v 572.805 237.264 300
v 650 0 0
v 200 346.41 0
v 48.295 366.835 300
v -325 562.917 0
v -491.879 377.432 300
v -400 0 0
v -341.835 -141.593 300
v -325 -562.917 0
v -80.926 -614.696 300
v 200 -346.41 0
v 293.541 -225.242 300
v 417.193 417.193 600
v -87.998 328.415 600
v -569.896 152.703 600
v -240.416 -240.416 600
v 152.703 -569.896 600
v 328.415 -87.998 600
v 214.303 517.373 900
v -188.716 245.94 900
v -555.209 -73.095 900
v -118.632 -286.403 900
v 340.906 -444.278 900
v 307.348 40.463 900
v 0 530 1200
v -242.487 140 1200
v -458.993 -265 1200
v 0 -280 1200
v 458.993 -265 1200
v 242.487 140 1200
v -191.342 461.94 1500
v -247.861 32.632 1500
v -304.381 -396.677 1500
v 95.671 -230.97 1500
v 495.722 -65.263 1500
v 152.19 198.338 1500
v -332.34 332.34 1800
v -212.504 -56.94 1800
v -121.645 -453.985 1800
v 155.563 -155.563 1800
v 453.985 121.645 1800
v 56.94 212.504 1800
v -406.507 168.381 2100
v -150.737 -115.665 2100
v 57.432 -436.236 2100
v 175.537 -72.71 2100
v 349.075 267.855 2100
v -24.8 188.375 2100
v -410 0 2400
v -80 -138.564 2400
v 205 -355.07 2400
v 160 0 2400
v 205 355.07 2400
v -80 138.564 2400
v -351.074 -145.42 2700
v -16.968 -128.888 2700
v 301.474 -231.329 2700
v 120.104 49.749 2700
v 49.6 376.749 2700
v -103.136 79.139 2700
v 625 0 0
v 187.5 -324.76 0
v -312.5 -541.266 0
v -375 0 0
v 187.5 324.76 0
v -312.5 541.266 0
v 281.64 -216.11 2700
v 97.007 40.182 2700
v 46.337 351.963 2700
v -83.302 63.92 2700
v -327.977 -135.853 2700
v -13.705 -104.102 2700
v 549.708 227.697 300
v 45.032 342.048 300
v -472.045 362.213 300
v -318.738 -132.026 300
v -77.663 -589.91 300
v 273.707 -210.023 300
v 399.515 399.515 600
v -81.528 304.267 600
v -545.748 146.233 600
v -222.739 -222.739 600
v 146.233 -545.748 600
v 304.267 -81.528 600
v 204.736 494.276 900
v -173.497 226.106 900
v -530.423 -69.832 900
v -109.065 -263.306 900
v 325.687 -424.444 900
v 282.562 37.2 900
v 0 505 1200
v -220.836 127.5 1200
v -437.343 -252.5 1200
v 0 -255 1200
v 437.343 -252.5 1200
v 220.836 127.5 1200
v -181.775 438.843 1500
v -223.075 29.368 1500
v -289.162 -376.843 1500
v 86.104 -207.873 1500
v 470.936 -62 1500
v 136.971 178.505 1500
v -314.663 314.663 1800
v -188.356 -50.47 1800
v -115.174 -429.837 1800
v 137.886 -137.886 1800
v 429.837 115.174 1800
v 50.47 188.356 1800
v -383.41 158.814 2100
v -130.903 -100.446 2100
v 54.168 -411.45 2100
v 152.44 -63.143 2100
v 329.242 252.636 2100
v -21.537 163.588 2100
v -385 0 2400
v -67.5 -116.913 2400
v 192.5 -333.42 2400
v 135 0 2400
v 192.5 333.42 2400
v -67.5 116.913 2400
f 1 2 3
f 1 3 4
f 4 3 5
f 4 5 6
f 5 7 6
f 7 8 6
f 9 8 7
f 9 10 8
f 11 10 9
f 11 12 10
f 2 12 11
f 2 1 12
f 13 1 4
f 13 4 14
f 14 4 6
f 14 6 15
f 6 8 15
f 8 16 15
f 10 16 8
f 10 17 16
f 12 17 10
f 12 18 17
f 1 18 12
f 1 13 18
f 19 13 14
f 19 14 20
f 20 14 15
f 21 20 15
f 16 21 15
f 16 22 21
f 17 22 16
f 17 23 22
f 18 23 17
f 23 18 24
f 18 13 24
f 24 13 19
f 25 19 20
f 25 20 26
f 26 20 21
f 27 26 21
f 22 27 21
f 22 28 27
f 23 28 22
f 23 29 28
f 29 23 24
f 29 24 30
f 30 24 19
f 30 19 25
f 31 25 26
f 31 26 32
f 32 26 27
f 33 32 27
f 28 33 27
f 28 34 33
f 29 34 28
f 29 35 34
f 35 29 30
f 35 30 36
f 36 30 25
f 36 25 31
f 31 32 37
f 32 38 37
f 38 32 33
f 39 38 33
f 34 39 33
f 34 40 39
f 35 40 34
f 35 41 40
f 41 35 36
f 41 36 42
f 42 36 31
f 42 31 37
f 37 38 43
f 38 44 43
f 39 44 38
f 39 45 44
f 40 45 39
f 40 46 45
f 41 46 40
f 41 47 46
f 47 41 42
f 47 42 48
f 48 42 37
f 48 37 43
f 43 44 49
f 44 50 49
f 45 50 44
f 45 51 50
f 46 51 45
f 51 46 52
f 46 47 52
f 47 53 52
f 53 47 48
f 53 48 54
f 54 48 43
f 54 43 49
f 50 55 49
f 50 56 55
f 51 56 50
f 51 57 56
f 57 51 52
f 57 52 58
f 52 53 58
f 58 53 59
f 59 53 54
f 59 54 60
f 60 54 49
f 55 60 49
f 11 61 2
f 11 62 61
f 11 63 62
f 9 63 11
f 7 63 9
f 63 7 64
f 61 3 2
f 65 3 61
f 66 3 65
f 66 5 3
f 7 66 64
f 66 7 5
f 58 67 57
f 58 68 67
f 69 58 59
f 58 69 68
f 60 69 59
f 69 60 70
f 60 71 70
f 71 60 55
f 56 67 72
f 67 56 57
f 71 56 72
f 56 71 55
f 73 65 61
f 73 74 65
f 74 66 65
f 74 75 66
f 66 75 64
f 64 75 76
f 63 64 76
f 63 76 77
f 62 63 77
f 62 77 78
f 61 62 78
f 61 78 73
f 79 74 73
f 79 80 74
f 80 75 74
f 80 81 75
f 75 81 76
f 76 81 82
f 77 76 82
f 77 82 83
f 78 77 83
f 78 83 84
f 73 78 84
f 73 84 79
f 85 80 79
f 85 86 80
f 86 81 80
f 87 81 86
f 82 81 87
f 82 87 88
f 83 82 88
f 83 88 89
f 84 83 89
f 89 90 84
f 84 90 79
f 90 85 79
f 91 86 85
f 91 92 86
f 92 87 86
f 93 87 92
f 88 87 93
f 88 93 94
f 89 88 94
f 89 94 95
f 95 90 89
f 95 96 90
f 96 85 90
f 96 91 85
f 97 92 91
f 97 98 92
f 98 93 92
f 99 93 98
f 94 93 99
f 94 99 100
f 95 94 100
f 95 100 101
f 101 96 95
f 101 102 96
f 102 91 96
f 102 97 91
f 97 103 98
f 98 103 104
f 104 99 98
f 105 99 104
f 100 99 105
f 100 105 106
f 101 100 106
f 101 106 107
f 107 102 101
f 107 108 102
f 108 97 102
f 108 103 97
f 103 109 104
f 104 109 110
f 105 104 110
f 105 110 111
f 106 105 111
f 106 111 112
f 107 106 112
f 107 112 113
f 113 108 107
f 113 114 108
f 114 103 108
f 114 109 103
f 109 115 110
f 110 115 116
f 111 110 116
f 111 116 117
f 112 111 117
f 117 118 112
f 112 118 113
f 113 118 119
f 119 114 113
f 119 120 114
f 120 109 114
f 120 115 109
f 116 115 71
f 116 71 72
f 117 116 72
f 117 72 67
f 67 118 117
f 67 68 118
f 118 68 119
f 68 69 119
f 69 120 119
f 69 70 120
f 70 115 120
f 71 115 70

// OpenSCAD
difference() {
	polyhedron(faces = [[0, 6, 1], [1, 6, 7], [1, 7, 2], [2, 7, 8], [2, 8, 3], [3, 8, 9], [3, 9, 4], [4, 9, 10], [4, 10, 5], [5, 10, 11], [5, 11, 0], [0, 11, 6], [6, 12, 7], [7, 12, 13], [7, 13, 8], [8, 13, 14], [8, 14, 9], [9, 14, 15], [9, 15, 10], [10, 15, 16], [10, 16, 11], [11, 16, 17], [11, 17, 6], [6, 17, 12], [12, 18, 13], [13, 18, 19], [13, 19, 14], [14, 19, 20], [14, 20, 15], [15, 20, 21], [15, 21, 16], [16, 21, 22], [16, 22, 17], [17, 22, 23], [17, 23, 12], [12, 23, 18], [18, 24, 19], [19, 24, 25], [19, 25, 20], [20, 25, 26], [20, 26, 21], [21, 26, 27], [21, 27, 22], [22, 27, 28], [22, 28, 23], [23, 28, 29], [23, 29, 18], [18, 29, 24], [24, 30, 25], [25, 30, 31], [25, 31, 26], [26, 31, 32], [26, 32, 27], [27, 32, 33], [27, 33, 28], [28, 33, 34], [28, 34, 29], [29, 34, 35], [29, 35, 24], [24, 35, 30], [30, 36, 31], [31, 36, 37], [31, 37, 32], [32, 37, 38], [32, 38, 33], [33, 38, 39], [33, 39, 34], [34, 39, 40], [34, 40, 35], [35, 40, 41], [35, 41, 30], [30, 41, 36], [36, 42, 37], [37, 42, 43], [37, 43, 38], [38, 43, 44], [38, 44, 39], [39, 44, 45], [39, 45, 40], [40, 45, 46], [40, 46, 41], [41, 46, 47], [41, 47, 36], [36, 47, 42], [42, 48, 43], [43, 48, 49], [43, 49, 44], [44, 49, 50], [44, 50, 45], [45, 50, 51], [45, 51, 46], [46, 51, 52], [46, 52, 47], [47, 52, 53], [47, 53, 42], [42, 53, 48], [48, 54, 49], [49, 54, 55], [49, 55, 50], [50, 55, 56], [50, 56, 51], [51, 56, 57], [51, 57, 52], [52, 57, 58], [52, 58, 53], [53, 58, 59], [53, 59, 48], [48, 59, 54], [1, 60, 0], [54, 61, 55], [2, 60, 1], [55, 61, 56], [3, 60, 2], [56, 61, 57], [4, 60, 3], [57, 61, 58], [5, 60, 4], [58, 61, 59], [0, 60, 5], [59, 61, 54]], points = [[650.0000000000, 0.0000000000, 0.0000000000], [200.0000000000, 346.4101615138, 0.0000000000], [-325.0000000000, 562.9165124599, 0.0000000000], [-400.0000000000, 0.0000000000, 0.0000000000], [-325.0000000000, -562.9165124599, 0.0000000000], [200.0000000000, -346.4101615138, 0.0000000000], [572.8053101570, 237.2637280664, 300.0000000000], [48.2946911214, 366.8345987083, 300.0000000000], [-491.8790709806, 377.4320859854, 300.0000000000], [-341.8354270292, -141.5928699751, 300.0000000000], [-80.9262391764, -614.6958140518, 300.0000000000], [293.5407359078, -225.2417287332, 300.0000000000], [417.1930009001, 417.1930009001, 600.0000000000], [-87.9984753349, 328.4147809383, 600.0000000000], [-569.8962375106, 152.7032366105, 600.0000000000], [-240.4163056034, -240.4163056034, 600.0000000000], [152.7032366105, -569.8962375106, 600.0000000000], [328.4147809383, -87.9984753349, 600.0000000000], [214.3027221245, 517.3725382063, 900.0000000000], [-188.7160429927, 245.9395354903, 900.0000000000], [-555.2091223693, -73.0946676432, 900.0000000000], [-118.6318640332, -286.4026550785, 900.0000000000], [340.9064002449, -444.2778705631, 900.0000000000], [307.3479070259, 40.4631195882, 900.0000000000], [0.0000000000, 530.0000000000, 1200.0000000000], [-242.4871130596, 140.0000000000, 1200.0000000000], [-458.9934640058, -265.0000000000, 1200.0000000000], [-0.0000000000, -280.0000000000, 1200.0000000000], [458.9934640058, -265.0000000000, 1200.0000000000], [242.4871130596, 140.0000000000, 1200.0000000000], [-191.3417161825, 461.9397662556, 1500.0000000000], [-247.8612153435, 32.6315480550, 1500.0000000000], [-304.3807145044, -396.6766701456, 1500.0000000000], [95.6708580913, -230.9698831278, 1500.0000000000], [495.7224306869, -65.2630961100, 1500.0000000000], [152.1903572522, 198.3383350728, 1500.0000000000], [-332.3401871577, 332.3401871577, 1800.0000000000], [-212.5036817836, -56.9401899226, 1800.0000000000], [-121.6449511982, -453.9851383559, 1800.0000000000], [155.5634918610, -155.5634918610, 1800.0000000000], [453.9851383559, 121.6449511982, 1800.0000000000], [56.9401899226, 212.5036817836, 1800.0000000000], [-406.5069943050, 168.3807102406, 2100.0000000000], [-150.7371346553, -115.6646715117, 2100.0000000000], [57.4315245768, -436.2357390045, 2100.0000000000], [175.5371111771, -72.7098521494, 2100.0000000000], [349.0754697281, 267.8550287638, 2100.0000000000], [-24.7999765218, 188.3745236610, 2100.0000000000], [-410.0000000000, 0.0000000000, 2400.0000000000], [-80.0000000000, -138.5640646055, 2400.0000000000], [205.0000000000, -355.0704155516, 2400.0000000000], [160.0000000000, -0.0000000000, 2400.0000000000], [205.0000000000, 355.0704155516, 2400.0000000000], [-80.0000000000, 138.5640646055, 2400.0000000000], [-351.0742223543, -145.4197042987, 2700.0000000000], [-16.9684049886, -128.8878319786, 2700.0000000000], [301.4742693107, -231.3293430233, 2700.0000000000], [120.1043392265, 49.7488462075, 2700.0000000000], [49.5999530436, 376.7490473220, 2700.0000000000], [-103.1359342379, 79.1389857711, 2700.0000000000], [-0.0000000000, 0.0000000000, 0.0000000000], [0.0000000000, -0.0000000000, 2700.0000000000]]);
	polyhedron(faces = [[0, 6, 1], [1, 6, 7], [1, 7, 2], [2, 7, 8], [2, 8, 3], [3, 8, 9], [3, 9, 4], [4, 9, 10], [4, 10, 5], [5, 10, 11], [5, 11, 0], [0, 11, 6], [6, 12, 7], [7, 12, 13], [7, 13, 8], [8, 13, 14], [8, 14, 9], [9, 14, 15], [9, 15, 10], [10, 15, 16], [10, 16, 11], [11, 16, 17], [11, 17, 6], [6, 17, 12], [12, 18, 13], [13, 18, 19], [13, 19, 14], [14, 19, 20], [14, 20, 15], [15, 20, 21], [15, 21, 16], [16, 21, 22], [16, 22, 17], [17, 22, 23], [17, 23, 12], [12, 23, 18], [18, 24, 19], [19, 24, 25], [19, 25, 20], [20, 25, 26], [20, 26, 21], [21, 26, 27], [21, 27, 22], [22, 27, 28], [22, 28, 23], [23, 28, 29], [23, 29, 18], [18, 29, 24], [24, 30, 25], [25, 30, 31], [25, 31, 26], [26, 31, 32], [26, 32, 27], [27, 32, 33], [27, 33, 28], [28, 33, 34], [28, 34, 29], [29, 34, 35], [29, 35, 24], [24, 35, 30], [30, 36, 31], [31, 36, 37], [31, 37, 32], [32, 37, 38], [32, 38, 33], [33, 38, 39], [33, 39, 34], [34, 39, 40], [34, 40, 35], [35, 40, 41], [35, 41, 30], [30, 41, 36], [36, 42, 37], [37, 42, 43], [37, 43, 38], [38, 43, 44], [38, 44, 39], [39, 44, 45], [39, 45, 40], [40, 45, 46], [40, 46, 41], [41, 46, 47], [41, 47, 36], [36, 47, 42], [42, 48, 43], [43, 48, 49], [43, 49, 44], [44, 49, 50], [44, 50, 45], [45, 50, 51], [45, 51, 46], [46, 51, 52], [46, 52, 47], [47, 52, 53], [47, 53, 42], [42, 53, 48], [48, 54, 49], [49, 54, 55], [49, 55, 50], [50, 55, 56], [50, 56, 51], [51, 56, 57], [51, 57, 52], [52, 57, 58], [52, 58, 53], [53, 58, 59], [53, 59, 48], [48, 59, 54], [1, 60, 0], [54, 61, 55], [2, 60, 1], [55, 61, 56], [3, 60, 2], [56, 61, 57], [4, 60, 3], [57, 61, 58], [5, 60, 4], [58, 61, 59], [0, 60, 5], [59, 61, 54]], points = [[625.0000000000, 0.0000000000, 0.0000000000], [187.5000000000, 324.7595264192, 0.0000000000], [-312.5000000000, 541.2658773653, 0.0000000000], [-375.0000000000, 0.0000000000, 0.0000000000], [-312.5000000000, -541.2658773653, 0.0000000000], [187.5000000000, -324.7595264192, 0.0000000000], [549.7083218442, 227.6966422572, 300.0000000000], [45.0315363159, 342.0484771740, 300.0000000000], [-472.0452374733, 362.2130502602, 300.0000000000], [-318.7384387164, -132.0257841660, 300.0000000000], [-77.6630843709, -589.9096925174, 300.0000000000], [273.7069024005, -210.0226930080, 300.0000000000], [399.5153313704, 399.5153313704, 600.0000000000], [-81.5279992073, 304.2666352811, 600.0000000000], [-545.7480918533, 146.2327604829, 600.0000000000], [-222.7386360738, -222.7386360738, 600.0000000000], [146.2327604829, -545.7480918533, 600.0000000000], [304.2666352811, -81.5279992073, 600.0000000000], [204.7356363153, 494.2755498935, 900.0000000000], [-173.4970072675, 226.1057019830, 900.0000000000], [-530.4230008350, -69.8315128377, 900.0000000000], [-109.0647782241, -263.3056667657, 900.0000000000], [325.6873645197, -424.4440370558, 900.0000000000], [282.5617854915, 37.1999647827, 900.0000000000], [0.0000000000, 505.0000000000, 1200.0000000000], [-220.8364779650, 127.5000000000, 1200.0000000000], [-437.3428289111, -252.5000000000, 1200.0000000000], [-0.0000000000, -255.0000000000, 1200.0000000000], [437.3428289111, -252.5000000000, 1200.0000000000], [220.8364779650, 127.5000000000, 1200.0000000000], [-181.7746303734, 438.8427779429, 1500.0000000000], [-223.0750938091, 29.3683932495, 1500.0000000000], [-289.1616787791, -376.8428366383, 1500.0000000000], [86.1037722821, -207.8728948150, 1500.0000000000], [470.9363091526, -61.9999413045, 1500.0000000000], [136.9713215270, 178.5045015655, 1500.0000000000], [-314.6625176280, 314.6625176280, 1800.0000000000], [-188.3555361264, -50.4697137950, 1800.0000000000], [-115.1744750706, -429.8369926986, 1800.0000000000], [137.8858223314, -137.8858223314, 1800.0000000000], [429.8369926986, 115.1744750706, 1800.0000000000], [50.4697137950, 188.3555361264, 1800.0000000000], [-383.4100059922, 158.8136244315, 2100.0000000000], [-130.9033011481, -100.4456357864, 2100.0000000000], [54.1683697713, -411.4496174701, 2100.0000000000], [152.4401228644, -63.1427663402, 2100.0000000000], [329.2416362209, 252.6359930386, 2100.0000000000], [-21.5368217163, 163.5884021267, 2100.0000000000], [-385.0000000000, 0.0000000000, 2400.0000000000], [-67.5000000000, -116.9134295109, 2400.0000000000], [192.5000000000, -333.4197804570, 2400.0000000000], [135.0000000000, -0.0000000000, 2400.0000000000], [192.5000000000, 333.4197804570, 2400.0000000000], [-67.5000000000, 116.9134295109, 2400.0000000000], [-327.9772340415, -135.8526184896, 2700.0000000000], [-13.7052501831, -104.1017104443, 2700.0000000000], [281.6404358034, -216.1103072981, 2700.0000000000], [97.0073509137, 40.1817603983, 2700.0000000000], [46.3367982381, 351.9629257877, 2700.0000000000], [-83.3021007306, 63.9199500459, 2700.0000000000], [-0.0000000000, 0.0000000000, 0.0000000000], [0.0000000000, 0.0000000000, 2700.0000000000]]);
}
